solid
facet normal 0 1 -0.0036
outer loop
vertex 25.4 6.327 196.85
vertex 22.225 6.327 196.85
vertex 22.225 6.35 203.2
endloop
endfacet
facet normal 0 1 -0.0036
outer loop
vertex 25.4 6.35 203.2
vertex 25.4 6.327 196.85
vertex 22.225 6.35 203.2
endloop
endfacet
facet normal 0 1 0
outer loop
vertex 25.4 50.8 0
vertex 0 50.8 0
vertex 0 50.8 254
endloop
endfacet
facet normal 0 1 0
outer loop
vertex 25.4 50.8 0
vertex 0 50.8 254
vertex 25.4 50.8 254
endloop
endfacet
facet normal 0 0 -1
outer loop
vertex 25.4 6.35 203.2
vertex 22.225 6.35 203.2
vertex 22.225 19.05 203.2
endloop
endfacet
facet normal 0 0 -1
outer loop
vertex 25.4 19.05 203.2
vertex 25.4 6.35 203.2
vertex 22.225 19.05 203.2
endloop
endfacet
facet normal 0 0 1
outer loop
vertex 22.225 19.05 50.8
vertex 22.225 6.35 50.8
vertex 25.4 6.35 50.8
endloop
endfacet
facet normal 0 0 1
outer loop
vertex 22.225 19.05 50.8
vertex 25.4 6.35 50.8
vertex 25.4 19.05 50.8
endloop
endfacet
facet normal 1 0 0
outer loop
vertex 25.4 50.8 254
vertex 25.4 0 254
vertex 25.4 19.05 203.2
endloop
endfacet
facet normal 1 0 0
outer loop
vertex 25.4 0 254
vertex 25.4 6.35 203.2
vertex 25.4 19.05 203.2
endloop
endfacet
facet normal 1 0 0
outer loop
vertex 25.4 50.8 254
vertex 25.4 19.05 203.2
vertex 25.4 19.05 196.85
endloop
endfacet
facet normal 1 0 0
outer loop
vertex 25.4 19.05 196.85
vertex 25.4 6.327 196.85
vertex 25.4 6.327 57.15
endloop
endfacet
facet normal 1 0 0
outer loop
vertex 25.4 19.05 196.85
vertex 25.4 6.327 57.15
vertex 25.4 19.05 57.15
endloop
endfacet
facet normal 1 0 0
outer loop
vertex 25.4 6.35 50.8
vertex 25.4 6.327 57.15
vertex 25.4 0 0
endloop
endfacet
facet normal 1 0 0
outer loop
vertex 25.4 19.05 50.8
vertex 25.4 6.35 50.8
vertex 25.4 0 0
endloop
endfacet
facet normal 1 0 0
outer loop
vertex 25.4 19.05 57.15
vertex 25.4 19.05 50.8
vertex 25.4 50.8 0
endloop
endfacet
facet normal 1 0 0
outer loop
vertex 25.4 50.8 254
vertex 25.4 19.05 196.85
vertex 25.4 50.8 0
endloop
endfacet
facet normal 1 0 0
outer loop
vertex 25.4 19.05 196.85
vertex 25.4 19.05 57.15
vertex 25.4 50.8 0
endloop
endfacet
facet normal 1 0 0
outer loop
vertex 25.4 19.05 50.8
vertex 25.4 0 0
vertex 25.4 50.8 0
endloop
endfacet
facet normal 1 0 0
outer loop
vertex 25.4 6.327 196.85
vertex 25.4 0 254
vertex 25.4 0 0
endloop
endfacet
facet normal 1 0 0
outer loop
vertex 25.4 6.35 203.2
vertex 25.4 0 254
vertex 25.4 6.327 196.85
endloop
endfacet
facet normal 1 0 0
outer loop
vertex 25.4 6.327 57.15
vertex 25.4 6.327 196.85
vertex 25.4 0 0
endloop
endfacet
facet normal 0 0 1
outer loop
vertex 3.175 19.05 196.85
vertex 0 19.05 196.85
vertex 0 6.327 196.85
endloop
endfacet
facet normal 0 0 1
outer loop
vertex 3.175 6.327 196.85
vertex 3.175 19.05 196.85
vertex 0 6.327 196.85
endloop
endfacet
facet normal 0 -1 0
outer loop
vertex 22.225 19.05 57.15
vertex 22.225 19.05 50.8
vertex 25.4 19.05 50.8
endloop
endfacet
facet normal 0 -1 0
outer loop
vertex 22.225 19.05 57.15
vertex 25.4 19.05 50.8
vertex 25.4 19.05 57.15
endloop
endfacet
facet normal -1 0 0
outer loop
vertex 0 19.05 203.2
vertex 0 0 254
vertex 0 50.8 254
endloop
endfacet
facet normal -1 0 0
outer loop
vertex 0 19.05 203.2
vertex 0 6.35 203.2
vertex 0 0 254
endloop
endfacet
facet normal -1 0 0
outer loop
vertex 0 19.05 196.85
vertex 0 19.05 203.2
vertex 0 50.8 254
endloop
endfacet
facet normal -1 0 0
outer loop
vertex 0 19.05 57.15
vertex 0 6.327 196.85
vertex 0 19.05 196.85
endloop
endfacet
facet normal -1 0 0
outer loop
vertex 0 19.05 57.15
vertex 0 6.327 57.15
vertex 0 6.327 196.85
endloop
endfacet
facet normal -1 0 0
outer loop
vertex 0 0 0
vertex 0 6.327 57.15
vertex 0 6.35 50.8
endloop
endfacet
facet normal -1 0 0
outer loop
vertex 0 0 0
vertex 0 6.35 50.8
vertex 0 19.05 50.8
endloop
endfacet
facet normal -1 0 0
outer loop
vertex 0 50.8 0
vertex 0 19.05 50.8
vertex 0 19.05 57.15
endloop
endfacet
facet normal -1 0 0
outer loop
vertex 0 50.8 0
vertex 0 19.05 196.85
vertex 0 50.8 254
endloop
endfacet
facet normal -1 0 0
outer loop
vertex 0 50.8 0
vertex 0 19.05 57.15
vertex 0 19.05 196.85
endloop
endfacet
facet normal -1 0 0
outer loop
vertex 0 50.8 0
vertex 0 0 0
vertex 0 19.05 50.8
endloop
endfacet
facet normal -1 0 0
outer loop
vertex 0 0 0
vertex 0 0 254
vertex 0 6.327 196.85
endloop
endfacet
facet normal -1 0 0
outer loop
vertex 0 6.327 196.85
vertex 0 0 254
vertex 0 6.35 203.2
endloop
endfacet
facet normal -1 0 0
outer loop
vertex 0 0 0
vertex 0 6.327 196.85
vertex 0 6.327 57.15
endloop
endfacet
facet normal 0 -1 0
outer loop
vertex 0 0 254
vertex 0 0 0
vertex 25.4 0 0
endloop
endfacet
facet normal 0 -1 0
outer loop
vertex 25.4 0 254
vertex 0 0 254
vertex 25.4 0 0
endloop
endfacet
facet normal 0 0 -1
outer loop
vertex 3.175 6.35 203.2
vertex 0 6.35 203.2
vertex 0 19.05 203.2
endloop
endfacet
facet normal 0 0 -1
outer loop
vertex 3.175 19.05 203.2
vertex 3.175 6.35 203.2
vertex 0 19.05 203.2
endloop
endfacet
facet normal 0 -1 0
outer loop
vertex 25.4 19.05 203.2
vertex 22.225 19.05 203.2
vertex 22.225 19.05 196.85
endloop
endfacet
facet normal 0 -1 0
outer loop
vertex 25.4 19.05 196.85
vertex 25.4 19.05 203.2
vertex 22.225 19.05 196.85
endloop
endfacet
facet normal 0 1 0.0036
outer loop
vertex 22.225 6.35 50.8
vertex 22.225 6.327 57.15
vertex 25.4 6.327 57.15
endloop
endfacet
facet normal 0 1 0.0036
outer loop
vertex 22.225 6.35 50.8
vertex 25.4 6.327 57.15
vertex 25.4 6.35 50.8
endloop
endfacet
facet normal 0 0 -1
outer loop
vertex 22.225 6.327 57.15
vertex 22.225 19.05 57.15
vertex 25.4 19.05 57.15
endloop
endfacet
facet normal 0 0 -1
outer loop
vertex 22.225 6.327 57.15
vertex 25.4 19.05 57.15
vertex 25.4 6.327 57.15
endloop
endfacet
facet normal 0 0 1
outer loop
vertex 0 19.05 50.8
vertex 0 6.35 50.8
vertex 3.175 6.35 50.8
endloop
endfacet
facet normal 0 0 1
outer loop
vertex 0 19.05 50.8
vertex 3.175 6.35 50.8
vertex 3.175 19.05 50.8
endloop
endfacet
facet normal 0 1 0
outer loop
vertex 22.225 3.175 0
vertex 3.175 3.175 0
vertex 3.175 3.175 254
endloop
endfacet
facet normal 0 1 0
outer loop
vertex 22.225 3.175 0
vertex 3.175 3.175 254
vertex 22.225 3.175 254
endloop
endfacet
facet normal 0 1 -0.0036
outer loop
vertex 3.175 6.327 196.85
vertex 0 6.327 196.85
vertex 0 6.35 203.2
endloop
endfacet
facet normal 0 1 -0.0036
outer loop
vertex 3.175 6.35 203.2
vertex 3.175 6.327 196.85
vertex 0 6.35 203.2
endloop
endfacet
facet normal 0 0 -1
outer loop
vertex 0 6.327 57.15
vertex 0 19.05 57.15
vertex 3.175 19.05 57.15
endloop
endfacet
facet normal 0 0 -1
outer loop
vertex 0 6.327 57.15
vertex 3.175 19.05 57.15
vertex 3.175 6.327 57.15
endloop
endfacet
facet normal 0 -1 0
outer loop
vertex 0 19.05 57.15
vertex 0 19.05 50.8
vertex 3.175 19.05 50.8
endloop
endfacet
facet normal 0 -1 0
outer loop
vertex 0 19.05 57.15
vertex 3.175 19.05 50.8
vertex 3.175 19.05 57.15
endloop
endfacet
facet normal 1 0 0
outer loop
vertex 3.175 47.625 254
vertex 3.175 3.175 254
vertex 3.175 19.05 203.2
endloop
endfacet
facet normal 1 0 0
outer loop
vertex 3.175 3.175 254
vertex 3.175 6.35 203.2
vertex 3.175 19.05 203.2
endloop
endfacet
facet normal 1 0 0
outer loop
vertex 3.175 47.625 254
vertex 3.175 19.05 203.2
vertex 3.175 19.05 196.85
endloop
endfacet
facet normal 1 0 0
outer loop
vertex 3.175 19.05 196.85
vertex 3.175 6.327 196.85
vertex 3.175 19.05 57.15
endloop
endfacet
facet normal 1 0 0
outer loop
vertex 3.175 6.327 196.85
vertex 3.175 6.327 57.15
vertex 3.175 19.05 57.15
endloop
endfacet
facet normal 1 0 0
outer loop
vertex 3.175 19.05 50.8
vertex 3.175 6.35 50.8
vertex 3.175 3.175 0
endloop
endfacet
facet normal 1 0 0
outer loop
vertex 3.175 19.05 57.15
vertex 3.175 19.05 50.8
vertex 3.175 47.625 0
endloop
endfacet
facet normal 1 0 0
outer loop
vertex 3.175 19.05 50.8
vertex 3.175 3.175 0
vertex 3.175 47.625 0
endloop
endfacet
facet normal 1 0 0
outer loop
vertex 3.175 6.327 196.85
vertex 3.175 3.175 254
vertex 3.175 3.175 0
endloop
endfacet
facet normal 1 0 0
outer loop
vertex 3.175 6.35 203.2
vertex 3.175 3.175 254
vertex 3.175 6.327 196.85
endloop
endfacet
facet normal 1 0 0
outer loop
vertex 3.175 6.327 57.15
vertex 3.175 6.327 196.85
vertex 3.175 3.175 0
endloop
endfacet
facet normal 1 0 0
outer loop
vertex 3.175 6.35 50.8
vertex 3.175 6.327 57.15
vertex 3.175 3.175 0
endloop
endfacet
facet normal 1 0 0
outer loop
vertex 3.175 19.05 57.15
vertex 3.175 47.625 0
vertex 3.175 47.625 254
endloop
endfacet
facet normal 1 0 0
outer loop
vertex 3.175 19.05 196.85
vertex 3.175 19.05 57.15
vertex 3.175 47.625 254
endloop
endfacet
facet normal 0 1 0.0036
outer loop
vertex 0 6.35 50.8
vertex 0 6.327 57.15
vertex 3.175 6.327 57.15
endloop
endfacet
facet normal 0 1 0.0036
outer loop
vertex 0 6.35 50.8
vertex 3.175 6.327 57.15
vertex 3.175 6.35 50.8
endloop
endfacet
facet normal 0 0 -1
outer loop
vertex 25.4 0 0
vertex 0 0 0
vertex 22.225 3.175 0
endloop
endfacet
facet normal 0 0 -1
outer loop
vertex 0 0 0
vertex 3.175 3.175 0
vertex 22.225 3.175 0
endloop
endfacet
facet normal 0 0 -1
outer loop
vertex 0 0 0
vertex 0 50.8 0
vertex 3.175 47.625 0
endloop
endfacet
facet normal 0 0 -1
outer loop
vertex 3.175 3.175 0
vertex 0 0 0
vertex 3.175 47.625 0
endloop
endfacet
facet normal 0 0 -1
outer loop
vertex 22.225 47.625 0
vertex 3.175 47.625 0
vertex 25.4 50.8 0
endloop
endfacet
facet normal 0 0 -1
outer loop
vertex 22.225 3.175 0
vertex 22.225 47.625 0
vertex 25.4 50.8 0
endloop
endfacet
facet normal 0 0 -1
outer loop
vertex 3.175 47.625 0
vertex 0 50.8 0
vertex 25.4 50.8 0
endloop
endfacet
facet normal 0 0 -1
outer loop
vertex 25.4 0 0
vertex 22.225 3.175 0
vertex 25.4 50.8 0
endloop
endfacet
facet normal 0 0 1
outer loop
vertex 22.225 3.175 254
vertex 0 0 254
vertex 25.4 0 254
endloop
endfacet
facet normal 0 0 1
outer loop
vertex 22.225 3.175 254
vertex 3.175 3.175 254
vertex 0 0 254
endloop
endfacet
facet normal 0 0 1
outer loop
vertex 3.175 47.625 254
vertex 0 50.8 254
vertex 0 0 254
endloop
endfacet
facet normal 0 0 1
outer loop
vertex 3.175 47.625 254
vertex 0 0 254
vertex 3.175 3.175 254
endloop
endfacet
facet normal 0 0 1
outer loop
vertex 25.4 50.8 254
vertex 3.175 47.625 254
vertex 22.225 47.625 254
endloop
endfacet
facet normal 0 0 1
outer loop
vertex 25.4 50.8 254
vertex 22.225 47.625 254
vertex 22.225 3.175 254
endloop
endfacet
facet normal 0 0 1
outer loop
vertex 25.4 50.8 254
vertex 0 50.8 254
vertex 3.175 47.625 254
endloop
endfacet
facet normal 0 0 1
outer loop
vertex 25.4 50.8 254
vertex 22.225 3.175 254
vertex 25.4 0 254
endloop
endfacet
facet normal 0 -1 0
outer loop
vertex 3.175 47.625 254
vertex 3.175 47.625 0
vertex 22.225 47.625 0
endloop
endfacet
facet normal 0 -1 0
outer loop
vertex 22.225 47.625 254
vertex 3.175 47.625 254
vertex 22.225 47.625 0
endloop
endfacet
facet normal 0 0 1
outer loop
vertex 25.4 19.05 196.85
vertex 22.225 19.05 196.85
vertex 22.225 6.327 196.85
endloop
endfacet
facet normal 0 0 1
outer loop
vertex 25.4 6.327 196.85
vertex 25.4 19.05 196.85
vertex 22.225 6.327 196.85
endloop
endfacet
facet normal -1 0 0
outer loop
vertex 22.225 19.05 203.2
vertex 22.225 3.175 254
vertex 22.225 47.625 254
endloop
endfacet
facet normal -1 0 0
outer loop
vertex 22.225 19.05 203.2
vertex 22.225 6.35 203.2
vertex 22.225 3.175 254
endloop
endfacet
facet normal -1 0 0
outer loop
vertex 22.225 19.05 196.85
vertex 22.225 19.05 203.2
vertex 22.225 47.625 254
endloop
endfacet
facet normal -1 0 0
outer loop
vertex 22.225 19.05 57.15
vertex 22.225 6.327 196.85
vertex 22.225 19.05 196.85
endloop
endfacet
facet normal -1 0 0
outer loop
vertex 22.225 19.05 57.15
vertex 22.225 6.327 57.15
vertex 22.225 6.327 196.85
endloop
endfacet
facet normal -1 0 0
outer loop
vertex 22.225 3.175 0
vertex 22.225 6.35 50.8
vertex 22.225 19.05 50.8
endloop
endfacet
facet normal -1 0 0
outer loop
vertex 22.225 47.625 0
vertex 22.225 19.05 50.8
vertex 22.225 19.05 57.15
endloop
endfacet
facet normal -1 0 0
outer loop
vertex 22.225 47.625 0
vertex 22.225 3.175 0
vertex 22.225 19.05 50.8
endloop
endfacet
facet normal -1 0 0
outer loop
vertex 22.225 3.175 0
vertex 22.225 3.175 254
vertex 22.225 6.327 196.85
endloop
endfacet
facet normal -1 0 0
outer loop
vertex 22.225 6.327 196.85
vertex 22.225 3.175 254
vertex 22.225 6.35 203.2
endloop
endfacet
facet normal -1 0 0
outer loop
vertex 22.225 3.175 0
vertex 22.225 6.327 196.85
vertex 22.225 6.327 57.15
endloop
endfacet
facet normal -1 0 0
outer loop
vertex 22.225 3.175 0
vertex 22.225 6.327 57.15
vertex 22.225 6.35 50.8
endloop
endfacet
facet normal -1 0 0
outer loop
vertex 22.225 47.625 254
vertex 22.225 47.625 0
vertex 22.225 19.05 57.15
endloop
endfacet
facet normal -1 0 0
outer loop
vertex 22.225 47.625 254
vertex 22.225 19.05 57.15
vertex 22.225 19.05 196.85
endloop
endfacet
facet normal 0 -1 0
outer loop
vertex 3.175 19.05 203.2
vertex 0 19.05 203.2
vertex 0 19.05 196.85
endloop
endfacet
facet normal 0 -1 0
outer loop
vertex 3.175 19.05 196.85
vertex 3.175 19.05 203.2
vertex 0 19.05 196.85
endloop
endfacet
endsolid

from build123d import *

# Parameters (mm, degrees)
SKETCH1_W           = 25.4
SKETCH1_H           = 50.8
SKETCH1_W_2         = 19.05
SKETCH1_H_2         = 44.45
BOSS_EXTRUDE1_DEPTH = 254
SKETCH2_R           = 6.482173328
CUT_EXTRUDE1_DEPTH  = 254
BOSS_EXTRUDE2_START = -25.4
SKETCH3_R           = 6.482173328
BOSS_EXTRUDE2_DEPTH = 25.4
SKETCH4_W           = 19.05
SKETCH4_H           = 44.45
CUT_EXTRUDE2_DEPTH  = 254
CUT_EXTRUDE3_DEPTH  = 254


with BuildPart() as part:
    # Sketch1 → Boss-Extrude1 (new body)
    with BuildSketch(Plane.XY):
        with Locations((12.7, 25.4)):
            Rectangle(SKETCH1_W, SKETCH1_H)
        with Locations((12.7, 25.4)):
            Rectangle(SKETCH1_W_2, SKETCH1_H_2, mode=Mode.SUBTRACT)
    extrude(amount=BOSS_EXTRUDE1_DEPTH)

    # Sketch2 → Cut-Extrude1 (cut)
    with BuildSketch(Plane(origin=(25.4, 0, 0), x_dir=(0, 0, -1), z_dir=(1, 0, 0))):
        with Locations((-209.55, 12.7)):
            Circle(SKETCH2_R)
        with Locations((-44.45, 12.7)):
            Circle(SKETCH2_R)
    extrude(amount=-CUT_EXTRUDE1_DEPTH, mode=Mode.SUBTRACT)

    # Sketch3 → Boss-Extrude2 (add)
    with BuildSketch(Plane.ZY.offset(BOSS_EXTRUDE2_START)):
        with Locations((209.55, 12.7)):
            Circle(SKETCH3_R)
        with Locations((44.45, 12.7)):
            Circle(SKETCH3_R)
    extrude(amount=BOSS_EXTRUDE2_DEPTH)

    # Sketch4 → Cut-Extrude2 (cut)
    with BuildSketch(Plane.XY.offset(254)):
        with Locations((12.7, 25.4)):
            Rectangle(SKETCH4_W, SKETCH4_H)
    extrude(amount=-CUT_EXTRUDE2_DEPTH, mode=Mode.SUBTRACT)

    # Sketch5 → Cut-Extrude3 (cut)
    with BuildSketch(Plane.ZY):
        Polygon((196.85, 19.05), (196.85, 6.326748406), (203.2, 6.35), (203.2, 19.05), align=None)
        Polygon((57.15, 6.326748406), (50.8, 6.35), (50.8, 19.05), (57.15, 19.05), align=None)
    extrude(amount=-CUT_EXTRUDE3_DEPTH, mode=Mode.SUBTRACT)


solid = part.part
